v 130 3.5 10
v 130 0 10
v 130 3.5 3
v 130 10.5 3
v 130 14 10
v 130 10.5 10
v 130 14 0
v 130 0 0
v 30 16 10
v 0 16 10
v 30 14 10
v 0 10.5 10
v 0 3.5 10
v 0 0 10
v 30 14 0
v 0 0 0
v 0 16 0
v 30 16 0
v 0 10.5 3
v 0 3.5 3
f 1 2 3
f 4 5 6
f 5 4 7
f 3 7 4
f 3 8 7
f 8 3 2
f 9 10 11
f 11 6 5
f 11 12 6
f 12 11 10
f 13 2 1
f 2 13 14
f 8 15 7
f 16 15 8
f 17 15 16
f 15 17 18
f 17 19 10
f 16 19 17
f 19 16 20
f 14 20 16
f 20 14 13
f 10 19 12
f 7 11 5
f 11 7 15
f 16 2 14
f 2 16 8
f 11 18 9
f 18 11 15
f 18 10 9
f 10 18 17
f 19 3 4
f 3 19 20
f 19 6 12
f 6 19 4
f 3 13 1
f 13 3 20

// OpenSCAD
$fn=100;

difference()
{
    union()
    {
	cube([130,14,10]);
    translate([0,14,0]) cube([30,2,10]);
    }
	translate([0,3.5,3]) cube([150,7,7]);
}
